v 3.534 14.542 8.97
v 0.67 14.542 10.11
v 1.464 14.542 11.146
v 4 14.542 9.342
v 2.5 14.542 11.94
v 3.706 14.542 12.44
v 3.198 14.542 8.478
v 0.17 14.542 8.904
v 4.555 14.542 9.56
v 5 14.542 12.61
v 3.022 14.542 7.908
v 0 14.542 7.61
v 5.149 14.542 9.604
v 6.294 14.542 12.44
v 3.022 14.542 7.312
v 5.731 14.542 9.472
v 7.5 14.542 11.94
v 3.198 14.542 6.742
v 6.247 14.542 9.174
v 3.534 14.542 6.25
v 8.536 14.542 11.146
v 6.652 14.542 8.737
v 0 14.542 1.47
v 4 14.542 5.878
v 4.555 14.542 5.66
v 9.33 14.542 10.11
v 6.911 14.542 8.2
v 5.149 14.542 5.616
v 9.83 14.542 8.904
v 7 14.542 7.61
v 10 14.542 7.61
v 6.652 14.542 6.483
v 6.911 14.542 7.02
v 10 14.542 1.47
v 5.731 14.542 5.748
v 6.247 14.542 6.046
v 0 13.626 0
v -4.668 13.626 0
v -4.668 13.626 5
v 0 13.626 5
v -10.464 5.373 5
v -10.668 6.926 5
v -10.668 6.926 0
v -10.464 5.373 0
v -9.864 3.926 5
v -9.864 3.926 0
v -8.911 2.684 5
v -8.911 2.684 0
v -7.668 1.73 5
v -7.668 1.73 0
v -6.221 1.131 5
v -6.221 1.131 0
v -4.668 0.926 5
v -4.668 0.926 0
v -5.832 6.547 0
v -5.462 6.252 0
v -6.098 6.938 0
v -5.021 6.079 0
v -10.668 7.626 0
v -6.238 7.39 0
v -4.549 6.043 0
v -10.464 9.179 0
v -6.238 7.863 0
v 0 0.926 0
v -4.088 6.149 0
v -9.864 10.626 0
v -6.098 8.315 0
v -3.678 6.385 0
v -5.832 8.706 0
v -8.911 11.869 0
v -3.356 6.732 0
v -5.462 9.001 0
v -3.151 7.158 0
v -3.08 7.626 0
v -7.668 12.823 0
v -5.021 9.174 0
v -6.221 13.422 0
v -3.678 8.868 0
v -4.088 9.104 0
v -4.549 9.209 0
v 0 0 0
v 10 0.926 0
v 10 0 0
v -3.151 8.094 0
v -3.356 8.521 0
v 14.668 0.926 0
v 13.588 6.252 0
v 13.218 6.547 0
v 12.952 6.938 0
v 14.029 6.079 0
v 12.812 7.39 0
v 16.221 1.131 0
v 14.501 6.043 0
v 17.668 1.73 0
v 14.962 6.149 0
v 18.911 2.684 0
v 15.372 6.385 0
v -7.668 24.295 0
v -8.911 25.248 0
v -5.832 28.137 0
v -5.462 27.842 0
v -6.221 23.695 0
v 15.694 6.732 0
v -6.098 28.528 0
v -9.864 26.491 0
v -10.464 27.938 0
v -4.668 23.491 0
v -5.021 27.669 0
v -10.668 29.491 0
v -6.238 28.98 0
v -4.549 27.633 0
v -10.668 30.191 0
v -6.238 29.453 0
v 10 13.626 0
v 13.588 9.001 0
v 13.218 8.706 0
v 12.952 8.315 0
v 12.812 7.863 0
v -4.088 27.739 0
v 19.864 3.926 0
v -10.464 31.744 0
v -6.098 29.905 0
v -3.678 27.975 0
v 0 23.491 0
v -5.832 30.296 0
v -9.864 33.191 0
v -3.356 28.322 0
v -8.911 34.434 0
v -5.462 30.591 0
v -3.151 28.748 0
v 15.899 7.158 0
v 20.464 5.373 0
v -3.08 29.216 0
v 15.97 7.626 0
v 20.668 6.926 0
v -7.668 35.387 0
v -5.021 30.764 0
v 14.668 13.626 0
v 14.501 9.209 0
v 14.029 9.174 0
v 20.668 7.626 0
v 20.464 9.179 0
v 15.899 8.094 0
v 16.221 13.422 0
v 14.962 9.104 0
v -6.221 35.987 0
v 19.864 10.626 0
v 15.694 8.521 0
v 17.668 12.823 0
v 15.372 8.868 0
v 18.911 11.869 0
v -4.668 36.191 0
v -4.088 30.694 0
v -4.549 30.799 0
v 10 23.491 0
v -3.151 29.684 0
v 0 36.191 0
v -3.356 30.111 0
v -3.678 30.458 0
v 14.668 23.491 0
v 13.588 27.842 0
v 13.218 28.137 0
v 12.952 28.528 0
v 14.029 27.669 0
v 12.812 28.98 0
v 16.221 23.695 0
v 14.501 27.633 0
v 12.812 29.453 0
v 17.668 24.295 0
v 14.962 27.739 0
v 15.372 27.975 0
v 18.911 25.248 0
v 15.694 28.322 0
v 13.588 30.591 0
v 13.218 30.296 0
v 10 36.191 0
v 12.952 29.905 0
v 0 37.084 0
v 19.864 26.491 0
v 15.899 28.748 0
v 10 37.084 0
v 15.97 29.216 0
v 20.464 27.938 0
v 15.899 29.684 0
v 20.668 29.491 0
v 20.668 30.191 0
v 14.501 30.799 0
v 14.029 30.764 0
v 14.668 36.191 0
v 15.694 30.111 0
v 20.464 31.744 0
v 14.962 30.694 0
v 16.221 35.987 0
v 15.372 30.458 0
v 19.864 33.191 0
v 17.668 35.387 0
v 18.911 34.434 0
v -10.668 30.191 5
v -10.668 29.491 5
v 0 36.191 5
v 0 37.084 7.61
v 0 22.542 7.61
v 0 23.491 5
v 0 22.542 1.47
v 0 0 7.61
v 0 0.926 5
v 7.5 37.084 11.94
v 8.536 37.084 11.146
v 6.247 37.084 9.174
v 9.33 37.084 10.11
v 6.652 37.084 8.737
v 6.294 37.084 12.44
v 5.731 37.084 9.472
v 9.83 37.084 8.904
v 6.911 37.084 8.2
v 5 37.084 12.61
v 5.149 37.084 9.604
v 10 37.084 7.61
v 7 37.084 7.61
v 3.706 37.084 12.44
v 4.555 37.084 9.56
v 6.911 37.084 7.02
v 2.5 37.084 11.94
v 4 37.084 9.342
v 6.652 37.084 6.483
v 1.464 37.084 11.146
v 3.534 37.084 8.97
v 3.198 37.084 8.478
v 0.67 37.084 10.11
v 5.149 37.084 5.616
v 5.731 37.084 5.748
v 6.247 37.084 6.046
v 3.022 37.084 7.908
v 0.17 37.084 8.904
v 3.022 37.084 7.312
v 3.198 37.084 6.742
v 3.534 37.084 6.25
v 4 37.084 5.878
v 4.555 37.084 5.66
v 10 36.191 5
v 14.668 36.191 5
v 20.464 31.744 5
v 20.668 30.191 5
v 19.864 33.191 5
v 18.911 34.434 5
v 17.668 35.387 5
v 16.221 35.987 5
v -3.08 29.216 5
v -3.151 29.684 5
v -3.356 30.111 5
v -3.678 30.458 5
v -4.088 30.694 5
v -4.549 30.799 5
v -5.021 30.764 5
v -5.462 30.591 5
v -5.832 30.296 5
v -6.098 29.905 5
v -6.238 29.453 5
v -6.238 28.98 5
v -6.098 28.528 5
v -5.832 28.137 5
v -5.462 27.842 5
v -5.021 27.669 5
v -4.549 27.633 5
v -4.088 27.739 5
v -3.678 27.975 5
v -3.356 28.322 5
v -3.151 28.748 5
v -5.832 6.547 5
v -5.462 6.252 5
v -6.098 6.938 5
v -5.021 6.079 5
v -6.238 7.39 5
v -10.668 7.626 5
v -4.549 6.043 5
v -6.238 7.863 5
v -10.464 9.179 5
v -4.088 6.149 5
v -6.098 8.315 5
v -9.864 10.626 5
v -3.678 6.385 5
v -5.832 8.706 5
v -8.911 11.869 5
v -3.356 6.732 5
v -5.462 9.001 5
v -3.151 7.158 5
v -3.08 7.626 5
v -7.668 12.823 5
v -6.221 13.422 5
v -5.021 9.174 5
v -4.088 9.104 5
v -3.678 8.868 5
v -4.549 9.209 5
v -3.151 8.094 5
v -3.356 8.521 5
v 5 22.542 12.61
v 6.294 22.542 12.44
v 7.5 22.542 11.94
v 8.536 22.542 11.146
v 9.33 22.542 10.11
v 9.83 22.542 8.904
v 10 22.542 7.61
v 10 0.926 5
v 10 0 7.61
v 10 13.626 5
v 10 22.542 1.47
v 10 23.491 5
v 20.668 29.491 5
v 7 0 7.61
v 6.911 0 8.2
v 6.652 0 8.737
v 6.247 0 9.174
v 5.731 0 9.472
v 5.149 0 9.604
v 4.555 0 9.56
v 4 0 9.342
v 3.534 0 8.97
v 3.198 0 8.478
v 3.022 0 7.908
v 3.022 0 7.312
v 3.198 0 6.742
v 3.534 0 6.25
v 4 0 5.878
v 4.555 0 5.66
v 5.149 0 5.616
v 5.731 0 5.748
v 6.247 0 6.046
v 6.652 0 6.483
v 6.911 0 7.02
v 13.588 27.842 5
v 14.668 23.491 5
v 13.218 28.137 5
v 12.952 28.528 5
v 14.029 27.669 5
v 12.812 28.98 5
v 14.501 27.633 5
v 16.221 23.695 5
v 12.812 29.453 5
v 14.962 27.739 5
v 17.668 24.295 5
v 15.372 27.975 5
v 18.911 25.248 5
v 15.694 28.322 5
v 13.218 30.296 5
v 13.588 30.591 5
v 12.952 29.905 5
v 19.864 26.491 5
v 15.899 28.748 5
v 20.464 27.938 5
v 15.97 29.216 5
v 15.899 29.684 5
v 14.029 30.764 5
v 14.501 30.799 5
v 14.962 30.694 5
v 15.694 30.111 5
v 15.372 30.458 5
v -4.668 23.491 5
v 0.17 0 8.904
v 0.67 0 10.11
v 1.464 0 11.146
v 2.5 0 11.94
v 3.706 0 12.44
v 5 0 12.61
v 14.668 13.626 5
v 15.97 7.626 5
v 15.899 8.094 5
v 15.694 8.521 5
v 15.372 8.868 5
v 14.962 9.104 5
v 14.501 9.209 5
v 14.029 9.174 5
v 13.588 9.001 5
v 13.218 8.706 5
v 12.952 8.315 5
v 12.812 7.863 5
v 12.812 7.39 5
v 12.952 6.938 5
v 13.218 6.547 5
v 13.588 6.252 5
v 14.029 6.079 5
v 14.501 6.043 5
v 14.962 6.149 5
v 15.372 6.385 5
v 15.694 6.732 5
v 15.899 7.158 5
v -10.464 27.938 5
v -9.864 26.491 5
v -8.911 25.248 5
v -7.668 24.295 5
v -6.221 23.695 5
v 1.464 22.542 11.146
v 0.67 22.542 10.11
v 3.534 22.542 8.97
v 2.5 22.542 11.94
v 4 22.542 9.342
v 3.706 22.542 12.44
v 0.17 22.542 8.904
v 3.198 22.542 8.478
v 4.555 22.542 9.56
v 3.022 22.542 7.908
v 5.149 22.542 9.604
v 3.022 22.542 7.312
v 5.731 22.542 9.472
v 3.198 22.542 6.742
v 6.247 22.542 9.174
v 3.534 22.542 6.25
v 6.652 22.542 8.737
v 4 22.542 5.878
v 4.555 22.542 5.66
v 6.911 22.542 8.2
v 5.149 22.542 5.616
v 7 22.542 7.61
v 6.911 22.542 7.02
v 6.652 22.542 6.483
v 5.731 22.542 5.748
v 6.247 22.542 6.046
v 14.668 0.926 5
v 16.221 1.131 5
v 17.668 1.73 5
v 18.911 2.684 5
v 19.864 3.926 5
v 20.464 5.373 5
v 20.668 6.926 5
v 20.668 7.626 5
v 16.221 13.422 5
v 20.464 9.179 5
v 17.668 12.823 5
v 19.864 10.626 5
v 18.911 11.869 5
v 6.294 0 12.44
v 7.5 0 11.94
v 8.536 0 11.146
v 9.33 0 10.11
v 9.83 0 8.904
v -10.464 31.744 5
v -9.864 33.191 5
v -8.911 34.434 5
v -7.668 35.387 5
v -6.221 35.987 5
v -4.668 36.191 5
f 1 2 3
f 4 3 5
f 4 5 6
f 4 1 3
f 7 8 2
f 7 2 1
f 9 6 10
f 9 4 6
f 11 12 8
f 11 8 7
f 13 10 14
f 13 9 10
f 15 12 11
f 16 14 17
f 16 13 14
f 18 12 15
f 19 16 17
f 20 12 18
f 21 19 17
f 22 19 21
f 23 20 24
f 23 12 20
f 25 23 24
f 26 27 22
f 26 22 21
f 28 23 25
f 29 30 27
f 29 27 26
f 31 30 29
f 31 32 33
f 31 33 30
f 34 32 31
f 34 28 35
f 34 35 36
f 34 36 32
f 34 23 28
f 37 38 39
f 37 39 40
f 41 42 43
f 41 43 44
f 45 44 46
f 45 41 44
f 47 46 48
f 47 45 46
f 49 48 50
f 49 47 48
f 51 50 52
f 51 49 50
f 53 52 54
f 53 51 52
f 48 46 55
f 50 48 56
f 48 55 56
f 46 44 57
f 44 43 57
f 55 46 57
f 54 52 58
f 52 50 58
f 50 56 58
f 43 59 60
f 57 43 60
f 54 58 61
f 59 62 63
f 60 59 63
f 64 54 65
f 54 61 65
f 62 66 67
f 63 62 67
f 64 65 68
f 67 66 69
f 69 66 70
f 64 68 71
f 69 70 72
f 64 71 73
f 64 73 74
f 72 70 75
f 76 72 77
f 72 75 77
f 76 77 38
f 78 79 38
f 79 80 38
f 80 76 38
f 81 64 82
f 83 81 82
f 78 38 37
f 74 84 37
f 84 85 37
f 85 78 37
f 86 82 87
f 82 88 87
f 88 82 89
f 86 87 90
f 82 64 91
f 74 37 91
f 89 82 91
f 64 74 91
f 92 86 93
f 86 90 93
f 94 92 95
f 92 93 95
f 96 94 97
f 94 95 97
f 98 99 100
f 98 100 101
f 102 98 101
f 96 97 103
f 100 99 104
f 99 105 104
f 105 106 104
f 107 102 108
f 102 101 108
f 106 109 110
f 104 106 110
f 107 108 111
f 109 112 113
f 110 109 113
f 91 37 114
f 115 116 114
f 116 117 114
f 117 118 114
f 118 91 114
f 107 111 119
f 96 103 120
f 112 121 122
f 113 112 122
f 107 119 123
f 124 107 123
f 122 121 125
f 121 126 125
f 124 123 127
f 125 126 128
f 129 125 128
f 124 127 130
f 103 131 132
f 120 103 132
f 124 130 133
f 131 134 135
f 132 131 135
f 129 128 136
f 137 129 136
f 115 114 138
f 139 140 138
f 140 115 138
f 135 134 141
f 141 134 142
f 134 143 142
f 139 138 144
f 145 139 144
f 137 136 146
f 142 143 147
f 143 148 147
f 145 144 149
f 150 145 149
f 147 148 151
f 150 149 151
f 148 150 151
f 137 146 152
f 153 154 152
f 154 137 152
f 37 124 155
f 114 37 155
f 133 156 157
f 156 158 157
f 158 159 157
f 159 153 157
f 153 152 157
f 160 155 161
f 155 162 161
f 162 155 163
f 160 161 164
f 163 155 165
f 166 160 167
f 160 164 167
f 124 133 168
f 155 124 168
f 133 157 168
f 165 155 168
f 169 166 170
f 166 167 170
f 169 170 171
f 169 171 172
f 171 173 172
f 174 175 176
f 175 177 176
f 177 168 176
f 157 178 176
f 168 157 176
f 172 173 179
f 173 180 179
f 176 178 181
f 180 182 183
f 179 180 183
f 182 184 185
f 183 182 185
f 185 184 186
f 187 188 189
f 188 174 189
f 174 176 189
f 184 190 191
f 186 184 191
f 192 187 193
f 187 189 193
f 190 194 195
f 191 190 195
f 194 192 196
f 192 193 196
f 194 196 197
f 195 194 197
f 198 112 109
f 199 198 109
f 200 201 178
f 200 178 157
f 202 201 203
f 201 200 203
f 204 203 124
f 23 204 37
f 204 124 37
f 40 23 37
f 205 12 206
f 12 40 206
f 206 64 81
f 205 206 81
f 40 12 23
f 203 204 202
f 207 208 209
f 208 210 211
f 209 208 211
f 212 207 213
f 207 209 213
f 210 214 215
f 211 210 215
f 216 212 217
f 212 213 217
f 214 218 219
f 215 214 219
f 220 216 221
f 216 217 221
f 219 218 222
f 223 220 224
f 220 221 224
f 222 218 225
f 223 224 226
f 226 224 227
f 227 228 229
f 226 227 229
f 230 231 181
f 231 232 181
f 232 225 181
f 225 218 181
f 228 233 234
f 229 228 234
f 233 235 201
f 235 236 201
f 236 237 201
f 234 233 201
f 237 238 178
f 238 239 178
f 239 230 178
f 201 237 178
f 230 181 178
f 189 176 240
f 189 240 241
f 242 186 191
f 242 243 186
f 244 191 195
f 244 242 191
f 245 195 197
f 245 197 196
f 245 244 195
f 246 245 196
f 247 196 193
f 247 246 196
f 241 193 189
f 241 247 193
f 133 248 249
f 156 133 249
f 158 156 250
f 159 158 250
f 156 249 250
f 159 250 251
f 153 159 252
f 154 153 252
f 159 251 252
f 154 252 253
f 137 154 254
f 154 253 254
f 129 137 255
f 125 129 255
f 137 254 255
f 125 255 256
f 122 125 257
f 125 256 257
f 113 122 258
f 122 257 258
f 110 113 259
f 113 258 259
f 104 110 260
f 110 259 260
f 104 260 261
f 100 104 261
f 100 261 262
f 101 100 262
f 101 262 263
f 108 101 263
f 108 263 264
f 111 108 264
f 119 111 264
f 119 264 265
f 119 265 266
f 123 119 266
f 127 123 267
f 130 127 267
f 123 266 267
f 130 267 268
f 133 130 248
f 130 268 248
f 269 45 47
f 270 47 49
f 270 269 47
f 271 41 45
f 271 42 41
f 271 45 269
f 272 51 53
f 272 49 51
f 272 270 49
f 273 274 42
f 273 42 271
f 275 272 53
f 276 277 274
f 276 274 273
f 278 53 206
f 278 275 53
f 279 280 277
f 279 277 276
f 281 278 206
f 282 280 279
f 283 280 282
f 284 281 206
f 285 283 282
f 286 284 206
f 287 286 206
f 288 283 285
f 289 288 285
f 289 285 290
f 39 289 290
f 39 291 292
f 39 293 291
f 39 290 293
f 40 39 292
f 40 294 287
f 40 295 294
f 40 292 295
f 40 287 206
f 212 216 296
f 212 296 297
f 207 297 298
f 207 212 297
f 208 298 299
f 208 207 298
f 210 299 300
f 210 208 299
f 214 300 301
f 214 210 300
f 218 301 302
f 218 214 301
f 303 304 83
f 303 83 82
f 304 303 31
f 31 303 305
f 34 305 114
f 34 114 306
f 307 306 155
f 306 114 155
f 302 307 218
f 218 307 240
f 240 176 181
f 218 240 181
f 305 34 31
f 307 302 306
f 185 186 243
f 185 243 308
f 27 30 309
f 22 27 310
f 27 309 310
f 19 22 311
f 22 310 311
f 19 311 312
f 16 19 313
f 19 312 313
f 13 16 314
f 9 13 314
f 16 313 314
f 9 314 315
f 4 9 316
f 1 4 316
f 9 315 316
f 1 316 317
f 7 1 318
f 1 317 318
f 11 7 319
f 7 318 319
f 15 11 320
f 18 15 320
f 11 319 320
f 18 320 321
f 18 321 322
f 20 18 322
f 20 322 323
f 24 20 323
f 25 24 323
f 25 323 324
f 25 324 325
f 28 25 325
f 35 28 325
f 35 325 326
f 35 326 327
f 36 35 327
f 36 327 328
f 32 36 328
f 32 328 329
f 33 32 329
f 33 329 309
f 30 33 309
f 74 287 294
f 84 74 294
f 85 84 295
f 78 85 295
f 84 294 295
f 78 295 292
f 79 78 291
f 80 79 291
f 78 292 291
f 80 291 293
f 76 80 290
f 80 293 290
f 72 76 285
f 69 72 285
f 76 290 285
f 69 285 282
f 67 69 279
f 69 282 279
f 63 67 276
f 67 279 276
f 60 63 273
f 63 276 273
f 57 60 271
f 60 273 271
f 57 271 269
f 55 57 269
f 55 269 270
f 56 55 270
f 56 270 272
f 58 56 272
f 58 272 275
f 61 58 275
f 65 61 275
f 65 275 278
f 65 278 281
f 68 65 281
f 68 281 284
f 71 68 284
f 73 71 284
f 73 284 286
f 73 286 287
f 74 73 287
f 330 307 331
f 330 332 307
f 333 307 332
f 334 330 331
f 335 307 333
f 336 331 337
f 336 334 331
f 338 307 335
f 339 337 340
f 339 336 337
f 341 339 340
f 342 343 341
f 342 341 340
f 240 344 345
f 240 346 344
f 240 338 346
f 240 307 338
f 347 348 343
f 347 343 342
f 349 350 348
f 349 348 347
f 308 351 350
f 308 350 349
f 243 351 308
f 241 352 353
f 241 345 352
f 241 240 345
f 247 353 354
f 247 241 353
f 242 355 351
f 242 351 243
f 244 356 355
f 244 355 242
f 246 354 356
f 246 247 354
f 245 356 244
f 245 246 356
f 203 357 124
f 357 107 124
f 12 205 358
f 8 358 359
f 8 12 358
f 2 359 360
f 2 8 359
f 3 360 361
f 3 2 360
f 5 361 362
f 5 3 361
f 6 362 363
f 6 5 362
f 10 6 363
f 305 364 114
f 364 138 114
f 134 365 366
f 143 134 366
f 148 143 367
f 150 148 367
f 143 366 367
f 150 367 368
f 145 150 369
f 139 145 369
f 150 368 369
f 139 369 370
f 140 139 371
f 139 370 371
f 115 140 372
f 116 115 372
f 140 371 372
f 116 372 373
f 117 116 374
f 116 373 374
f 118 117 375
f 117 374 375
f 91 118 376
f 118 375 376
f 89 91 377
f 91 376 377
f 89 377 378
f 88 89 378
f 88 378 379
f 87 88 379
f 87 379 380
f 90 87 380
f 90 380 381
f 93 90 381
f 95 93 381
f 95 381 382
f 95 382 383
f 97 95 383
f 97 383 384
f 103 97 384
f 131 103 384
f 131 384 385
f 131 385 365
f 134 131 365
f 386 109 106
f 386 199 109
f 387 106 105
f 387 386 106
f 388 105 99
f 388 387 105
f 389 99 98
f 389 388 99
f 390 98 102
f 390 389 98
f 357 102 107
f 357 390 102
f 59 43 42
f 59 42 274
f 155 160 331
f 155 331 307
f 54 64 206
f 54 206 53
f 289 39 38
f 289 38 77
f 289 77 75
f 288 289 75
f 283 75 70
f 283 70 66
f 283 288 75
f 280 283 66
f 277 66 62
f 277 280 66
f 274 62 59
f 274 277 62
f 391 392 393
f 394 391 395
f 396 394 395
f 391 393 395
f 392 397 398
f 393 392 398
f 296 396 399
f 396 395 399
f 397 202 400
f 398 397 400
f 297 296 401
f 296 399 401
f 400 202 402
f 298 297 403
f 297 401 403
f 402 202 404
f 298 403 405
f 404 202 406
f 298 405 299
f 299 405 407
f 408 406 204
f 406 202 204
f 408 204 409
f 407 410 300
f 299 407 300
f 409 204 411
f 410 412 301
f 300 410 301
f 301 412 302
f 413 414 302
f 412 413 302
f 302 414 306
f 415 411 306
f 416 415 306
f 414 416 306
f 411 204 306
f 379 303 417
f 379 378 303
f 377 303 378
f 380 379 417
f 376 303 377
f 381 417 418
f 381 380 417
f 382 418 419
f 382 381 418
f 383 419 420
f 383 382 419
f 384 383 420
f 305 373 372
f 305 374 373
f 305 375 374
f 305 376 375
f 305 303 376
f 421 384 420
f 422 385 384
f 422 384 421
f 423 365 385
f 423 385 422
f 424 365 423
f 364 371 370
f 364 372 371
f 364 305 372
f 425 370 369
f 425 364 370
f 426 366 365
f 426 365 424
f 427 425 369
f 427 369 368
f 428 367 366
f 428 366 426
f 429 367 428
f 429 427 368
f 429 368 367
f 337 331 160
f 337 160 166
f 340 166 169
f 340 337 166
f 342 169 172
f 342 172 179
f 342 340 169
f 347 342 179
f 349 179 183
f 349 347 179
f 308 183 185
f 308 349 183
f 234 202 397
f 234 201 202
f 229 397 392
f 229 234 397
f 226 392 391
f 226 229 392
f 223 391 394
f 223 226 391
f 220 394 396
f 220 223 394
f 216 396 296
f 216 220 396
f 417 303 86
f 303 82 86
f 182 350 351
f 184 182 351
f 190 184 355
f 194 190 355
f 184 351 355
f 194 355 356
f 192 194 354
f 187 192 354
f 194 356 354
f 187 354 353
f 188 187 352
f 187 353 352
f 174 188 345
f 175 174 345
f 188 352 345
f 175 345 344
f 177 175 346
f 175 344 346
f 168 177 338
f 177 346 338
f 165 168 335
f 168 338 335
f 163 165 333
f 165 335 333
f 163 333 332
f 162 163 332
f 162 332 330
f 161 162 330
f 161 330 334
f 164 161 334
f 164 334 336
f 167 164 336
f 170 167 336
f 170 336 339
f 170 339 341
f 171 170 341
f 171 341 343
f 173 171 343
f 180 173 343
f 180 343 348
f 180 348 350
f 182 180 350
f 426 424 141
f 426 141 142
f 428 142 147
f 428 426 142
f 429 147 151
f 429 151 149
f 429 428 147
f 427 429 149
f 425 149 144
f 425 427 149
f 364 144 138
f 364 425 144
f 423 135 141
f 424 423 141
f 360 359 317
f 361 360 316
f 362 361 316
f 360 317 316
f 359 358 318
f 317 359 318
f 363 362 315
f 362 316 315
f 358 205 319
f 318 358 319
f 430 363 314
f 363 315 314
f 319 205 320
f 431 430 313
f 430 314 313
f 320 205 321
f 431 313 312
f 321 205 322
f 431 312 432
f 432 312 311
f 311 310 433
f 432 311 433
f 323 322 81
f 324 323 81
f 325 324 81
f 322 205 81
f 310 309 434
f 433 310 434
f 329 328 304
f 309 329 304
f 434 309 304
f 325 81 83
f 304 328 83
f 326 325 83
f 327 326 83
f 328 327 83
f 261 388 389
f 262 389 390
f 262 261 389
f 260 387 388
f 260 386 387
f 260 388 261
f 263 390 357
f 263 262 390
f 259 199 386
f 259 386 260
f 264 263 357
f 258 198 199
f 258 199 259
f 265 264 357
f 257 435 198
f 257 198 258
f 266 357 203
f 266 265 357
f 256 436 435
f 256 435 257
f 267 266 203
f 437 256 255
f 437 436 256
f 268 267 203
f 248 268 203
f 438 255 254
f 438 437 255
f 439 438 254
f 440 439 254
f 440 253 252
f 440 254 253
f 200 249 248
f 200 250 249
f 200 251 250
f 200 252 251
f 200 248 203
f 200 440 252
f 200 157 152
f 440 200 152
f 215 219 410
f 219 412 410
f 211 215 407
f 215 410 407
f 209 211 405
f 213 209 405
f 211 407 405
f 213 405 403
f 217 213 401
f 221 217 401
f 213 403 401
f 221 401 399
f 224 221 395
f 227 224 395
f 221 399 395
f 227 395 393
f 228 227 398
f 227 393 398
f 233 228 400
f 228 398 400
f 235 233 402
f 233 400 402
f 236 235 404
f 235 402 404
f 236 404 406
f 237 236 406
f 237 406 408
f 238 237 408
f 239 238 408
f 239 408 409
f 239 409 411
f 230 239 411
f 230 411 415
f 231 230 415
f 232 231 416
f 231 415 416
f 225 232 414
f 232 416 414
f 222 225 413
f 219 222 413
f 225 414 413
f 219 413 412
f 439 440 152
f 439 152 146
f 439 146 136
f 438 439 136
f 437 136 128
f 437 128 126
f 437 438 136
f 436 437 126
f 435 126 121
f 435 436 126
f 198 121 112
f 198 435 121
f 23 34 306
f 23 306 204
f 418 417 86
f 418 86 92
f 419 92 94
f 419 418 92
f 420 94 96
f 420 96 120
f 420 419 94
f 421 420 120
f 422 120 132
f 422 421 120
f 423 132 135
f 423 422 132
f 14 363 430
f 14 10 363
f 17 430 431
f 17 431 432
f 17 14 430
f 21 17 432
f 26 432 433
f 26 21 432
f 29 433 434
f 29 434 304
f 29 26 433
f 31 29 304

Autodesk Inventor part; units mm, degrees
ref_plane "YZ Plane" through (0, 0, 0) normal (1, 0, 0) x (0, 1, 0)
ref_plane "XZ Plane" through (0, 0, 0) normal (0, 1, 0) x (-1, 0, 0)
sketch "Sketch1" plane through (0, 0, 0) normal (0, 0, 1) x (1, 0, 0)
  line L0 (0, 0) -> (10, 0)
  line L1 (10, 0) -> (10, 37.084)
  line L2 (10, 37.084) -> (0, 37.084)
  line L3 (0, 37.084) -> (0, 0)
  line L4 (0, 36.191) -> (-10.668, 36.191)
  line L5 (-10.668, 36.191) -> (-10.668, 23.491)
  line L6 (-10.668, 23.491) -> (0, 23.491)
  line L7 (0, 23.491) -> (0, 36.191)
  line L8 (0, 0.9264) -> (-10.668, 0.9264)
  line L9 (-10.668, 0.9264) -> (-10.668, 13.6264)
  line L10 (-10.668, 13.6264) -> (0, 13.6264)
  line L11 (0, 13.6264) -> (0, 0.9264)
  line L12 (5, 37.084) -> (5, 9.6109) construction
  line L13 (10, 36.191) -> (20.668, 36.191)
  line L14 (20.668, 36.191) -> (20.668, 23.491)
  line L15 (20.668, 23.491) -> (10, 23.491)
  line L16 (10, 0.9264) -> (20.668, 0.9264)
  line L17 (20.668, 0.9264) -> (20.668, 13.6264)
  line L18 (20.668, 13.6264) -> (10, 13.6264)
  line L19 (10, 36.191) -> (10, 23.491)
  line L20 (10, 13.6264) -> (10, 0.9264)
  dimension "d0" = 10
  dimension "d1" = 37.084
  dimension "d2" = 10.668
  dimension "d3" = 12.7
  dimension "d4" = 10.668
  dimension "d5" = 12.7
extrude "Extrusion1" add sketch "Sketch1" along normal blind 12.61 contours L3 L2 L1 L0
extrude "Extrusion2" add sketch "Sketch1" along normal blind 5 contours L8 L9 L10 L3 | L6 L5 L4 L3
extrude "Extrusion3" add sketch "Sketch1" along normal blind 5 contours L1 L18 L17 L16 | L1 L13 L14 L15
fillet "Fillet1" radius 5 2 edges at (10, 18.542, 12.61) (0, 18.542, 12.61)
fillet "Fillet2" radius 6 8 edges at (20.668, 36.191, 2.5) (20.668, 23.491, 2.5) (20.668, 13.6264, 2.5) (20.668, 0.9264, 2.5) (-10.668, 13.6264, 2.5) (-10.668, 36.191, 2.5) (-10.668, 23.491, 2.5) (-10.668, 0.9264, 2.5)
sketch "Sketch2" plane through (0, 0, 5) normal (0, 0, 1) x (1, 0, 0)
  arc A0 (-4.668, 13.6264) -> (-10.668, 7.6264) centre (-4.668, 7.6264) ccw projected
  circle A1 centre (-4.668, 7.6264) radius 1.5875
  line L0 (-4.668, 7.6264) -> (-4.668, 29.2164) construction
  line L1 (-4.668, 29.2164) -> (14.382, 29.2164) construction
  circle A2 centre (-4.668, 29.2164) radius 1.5875
  circle A3 centre (14.382, 29.2164) radius 1.5875
  circle A4 centre (14.382, 7.6264) radius 1.5875
  point P0 (0, 0)
  dimension "d14" = 3.175
  dimension "d15" = 21.59
  dimension "d16" = 19.05
  dimension "d17" = 3.175
  dimension "d18" = 3.175
  dimension "d19" = 3.175
extrude "Extrusion4" cut sketch "Sketch2" against normal blind 5
sketch "Sketch3" plane through (0, 0, 0) normal (0, -1, 0) x (1, 0, 0)
  arc A0 (10, 7.61) -> (0, 7.61) centre (5, 7.61) ccw projected
  circle A1 centre (5, 7.61) radius 2
  point P0 (0, 0)
  dimension "d22" = 4
extrude "Extrusion5" cut sketch "Sketch3" against normal blind 100
ref_plane "Work Plane1" through (0, 18.542, 0) normal (0, 1, 0) x (1, 0, 0)
sketch "Sketch4" plane through (0, 18.542, 0) normal (0, 1, 0) x (1, 0, 0)
  arc A0 (0, -7.61) -> (10, -7.61) centre (5, -7.61) ccw construction
  line L0 (5, -12.61) -> (5, -1.47) construction
  line L1 (10, -1.47) -> (0, -1.47)
  line L2 (0, 0) -> (0, -7.61) projected
  line L3 (0, -1.47) -> (-2.5969, -14.0453)
  line L4 (-2.5969, -14.0453) -> (12.3635, -14.2385)
  line L5 (12.3635, -14.2385) -> (10, -1.47)
  dimension "d25" = 11.14
extrude "Extrusion6" cut sketch "Sketch4" along normal mid plane 8
properties part number "Nose Gear Mounting Block"
